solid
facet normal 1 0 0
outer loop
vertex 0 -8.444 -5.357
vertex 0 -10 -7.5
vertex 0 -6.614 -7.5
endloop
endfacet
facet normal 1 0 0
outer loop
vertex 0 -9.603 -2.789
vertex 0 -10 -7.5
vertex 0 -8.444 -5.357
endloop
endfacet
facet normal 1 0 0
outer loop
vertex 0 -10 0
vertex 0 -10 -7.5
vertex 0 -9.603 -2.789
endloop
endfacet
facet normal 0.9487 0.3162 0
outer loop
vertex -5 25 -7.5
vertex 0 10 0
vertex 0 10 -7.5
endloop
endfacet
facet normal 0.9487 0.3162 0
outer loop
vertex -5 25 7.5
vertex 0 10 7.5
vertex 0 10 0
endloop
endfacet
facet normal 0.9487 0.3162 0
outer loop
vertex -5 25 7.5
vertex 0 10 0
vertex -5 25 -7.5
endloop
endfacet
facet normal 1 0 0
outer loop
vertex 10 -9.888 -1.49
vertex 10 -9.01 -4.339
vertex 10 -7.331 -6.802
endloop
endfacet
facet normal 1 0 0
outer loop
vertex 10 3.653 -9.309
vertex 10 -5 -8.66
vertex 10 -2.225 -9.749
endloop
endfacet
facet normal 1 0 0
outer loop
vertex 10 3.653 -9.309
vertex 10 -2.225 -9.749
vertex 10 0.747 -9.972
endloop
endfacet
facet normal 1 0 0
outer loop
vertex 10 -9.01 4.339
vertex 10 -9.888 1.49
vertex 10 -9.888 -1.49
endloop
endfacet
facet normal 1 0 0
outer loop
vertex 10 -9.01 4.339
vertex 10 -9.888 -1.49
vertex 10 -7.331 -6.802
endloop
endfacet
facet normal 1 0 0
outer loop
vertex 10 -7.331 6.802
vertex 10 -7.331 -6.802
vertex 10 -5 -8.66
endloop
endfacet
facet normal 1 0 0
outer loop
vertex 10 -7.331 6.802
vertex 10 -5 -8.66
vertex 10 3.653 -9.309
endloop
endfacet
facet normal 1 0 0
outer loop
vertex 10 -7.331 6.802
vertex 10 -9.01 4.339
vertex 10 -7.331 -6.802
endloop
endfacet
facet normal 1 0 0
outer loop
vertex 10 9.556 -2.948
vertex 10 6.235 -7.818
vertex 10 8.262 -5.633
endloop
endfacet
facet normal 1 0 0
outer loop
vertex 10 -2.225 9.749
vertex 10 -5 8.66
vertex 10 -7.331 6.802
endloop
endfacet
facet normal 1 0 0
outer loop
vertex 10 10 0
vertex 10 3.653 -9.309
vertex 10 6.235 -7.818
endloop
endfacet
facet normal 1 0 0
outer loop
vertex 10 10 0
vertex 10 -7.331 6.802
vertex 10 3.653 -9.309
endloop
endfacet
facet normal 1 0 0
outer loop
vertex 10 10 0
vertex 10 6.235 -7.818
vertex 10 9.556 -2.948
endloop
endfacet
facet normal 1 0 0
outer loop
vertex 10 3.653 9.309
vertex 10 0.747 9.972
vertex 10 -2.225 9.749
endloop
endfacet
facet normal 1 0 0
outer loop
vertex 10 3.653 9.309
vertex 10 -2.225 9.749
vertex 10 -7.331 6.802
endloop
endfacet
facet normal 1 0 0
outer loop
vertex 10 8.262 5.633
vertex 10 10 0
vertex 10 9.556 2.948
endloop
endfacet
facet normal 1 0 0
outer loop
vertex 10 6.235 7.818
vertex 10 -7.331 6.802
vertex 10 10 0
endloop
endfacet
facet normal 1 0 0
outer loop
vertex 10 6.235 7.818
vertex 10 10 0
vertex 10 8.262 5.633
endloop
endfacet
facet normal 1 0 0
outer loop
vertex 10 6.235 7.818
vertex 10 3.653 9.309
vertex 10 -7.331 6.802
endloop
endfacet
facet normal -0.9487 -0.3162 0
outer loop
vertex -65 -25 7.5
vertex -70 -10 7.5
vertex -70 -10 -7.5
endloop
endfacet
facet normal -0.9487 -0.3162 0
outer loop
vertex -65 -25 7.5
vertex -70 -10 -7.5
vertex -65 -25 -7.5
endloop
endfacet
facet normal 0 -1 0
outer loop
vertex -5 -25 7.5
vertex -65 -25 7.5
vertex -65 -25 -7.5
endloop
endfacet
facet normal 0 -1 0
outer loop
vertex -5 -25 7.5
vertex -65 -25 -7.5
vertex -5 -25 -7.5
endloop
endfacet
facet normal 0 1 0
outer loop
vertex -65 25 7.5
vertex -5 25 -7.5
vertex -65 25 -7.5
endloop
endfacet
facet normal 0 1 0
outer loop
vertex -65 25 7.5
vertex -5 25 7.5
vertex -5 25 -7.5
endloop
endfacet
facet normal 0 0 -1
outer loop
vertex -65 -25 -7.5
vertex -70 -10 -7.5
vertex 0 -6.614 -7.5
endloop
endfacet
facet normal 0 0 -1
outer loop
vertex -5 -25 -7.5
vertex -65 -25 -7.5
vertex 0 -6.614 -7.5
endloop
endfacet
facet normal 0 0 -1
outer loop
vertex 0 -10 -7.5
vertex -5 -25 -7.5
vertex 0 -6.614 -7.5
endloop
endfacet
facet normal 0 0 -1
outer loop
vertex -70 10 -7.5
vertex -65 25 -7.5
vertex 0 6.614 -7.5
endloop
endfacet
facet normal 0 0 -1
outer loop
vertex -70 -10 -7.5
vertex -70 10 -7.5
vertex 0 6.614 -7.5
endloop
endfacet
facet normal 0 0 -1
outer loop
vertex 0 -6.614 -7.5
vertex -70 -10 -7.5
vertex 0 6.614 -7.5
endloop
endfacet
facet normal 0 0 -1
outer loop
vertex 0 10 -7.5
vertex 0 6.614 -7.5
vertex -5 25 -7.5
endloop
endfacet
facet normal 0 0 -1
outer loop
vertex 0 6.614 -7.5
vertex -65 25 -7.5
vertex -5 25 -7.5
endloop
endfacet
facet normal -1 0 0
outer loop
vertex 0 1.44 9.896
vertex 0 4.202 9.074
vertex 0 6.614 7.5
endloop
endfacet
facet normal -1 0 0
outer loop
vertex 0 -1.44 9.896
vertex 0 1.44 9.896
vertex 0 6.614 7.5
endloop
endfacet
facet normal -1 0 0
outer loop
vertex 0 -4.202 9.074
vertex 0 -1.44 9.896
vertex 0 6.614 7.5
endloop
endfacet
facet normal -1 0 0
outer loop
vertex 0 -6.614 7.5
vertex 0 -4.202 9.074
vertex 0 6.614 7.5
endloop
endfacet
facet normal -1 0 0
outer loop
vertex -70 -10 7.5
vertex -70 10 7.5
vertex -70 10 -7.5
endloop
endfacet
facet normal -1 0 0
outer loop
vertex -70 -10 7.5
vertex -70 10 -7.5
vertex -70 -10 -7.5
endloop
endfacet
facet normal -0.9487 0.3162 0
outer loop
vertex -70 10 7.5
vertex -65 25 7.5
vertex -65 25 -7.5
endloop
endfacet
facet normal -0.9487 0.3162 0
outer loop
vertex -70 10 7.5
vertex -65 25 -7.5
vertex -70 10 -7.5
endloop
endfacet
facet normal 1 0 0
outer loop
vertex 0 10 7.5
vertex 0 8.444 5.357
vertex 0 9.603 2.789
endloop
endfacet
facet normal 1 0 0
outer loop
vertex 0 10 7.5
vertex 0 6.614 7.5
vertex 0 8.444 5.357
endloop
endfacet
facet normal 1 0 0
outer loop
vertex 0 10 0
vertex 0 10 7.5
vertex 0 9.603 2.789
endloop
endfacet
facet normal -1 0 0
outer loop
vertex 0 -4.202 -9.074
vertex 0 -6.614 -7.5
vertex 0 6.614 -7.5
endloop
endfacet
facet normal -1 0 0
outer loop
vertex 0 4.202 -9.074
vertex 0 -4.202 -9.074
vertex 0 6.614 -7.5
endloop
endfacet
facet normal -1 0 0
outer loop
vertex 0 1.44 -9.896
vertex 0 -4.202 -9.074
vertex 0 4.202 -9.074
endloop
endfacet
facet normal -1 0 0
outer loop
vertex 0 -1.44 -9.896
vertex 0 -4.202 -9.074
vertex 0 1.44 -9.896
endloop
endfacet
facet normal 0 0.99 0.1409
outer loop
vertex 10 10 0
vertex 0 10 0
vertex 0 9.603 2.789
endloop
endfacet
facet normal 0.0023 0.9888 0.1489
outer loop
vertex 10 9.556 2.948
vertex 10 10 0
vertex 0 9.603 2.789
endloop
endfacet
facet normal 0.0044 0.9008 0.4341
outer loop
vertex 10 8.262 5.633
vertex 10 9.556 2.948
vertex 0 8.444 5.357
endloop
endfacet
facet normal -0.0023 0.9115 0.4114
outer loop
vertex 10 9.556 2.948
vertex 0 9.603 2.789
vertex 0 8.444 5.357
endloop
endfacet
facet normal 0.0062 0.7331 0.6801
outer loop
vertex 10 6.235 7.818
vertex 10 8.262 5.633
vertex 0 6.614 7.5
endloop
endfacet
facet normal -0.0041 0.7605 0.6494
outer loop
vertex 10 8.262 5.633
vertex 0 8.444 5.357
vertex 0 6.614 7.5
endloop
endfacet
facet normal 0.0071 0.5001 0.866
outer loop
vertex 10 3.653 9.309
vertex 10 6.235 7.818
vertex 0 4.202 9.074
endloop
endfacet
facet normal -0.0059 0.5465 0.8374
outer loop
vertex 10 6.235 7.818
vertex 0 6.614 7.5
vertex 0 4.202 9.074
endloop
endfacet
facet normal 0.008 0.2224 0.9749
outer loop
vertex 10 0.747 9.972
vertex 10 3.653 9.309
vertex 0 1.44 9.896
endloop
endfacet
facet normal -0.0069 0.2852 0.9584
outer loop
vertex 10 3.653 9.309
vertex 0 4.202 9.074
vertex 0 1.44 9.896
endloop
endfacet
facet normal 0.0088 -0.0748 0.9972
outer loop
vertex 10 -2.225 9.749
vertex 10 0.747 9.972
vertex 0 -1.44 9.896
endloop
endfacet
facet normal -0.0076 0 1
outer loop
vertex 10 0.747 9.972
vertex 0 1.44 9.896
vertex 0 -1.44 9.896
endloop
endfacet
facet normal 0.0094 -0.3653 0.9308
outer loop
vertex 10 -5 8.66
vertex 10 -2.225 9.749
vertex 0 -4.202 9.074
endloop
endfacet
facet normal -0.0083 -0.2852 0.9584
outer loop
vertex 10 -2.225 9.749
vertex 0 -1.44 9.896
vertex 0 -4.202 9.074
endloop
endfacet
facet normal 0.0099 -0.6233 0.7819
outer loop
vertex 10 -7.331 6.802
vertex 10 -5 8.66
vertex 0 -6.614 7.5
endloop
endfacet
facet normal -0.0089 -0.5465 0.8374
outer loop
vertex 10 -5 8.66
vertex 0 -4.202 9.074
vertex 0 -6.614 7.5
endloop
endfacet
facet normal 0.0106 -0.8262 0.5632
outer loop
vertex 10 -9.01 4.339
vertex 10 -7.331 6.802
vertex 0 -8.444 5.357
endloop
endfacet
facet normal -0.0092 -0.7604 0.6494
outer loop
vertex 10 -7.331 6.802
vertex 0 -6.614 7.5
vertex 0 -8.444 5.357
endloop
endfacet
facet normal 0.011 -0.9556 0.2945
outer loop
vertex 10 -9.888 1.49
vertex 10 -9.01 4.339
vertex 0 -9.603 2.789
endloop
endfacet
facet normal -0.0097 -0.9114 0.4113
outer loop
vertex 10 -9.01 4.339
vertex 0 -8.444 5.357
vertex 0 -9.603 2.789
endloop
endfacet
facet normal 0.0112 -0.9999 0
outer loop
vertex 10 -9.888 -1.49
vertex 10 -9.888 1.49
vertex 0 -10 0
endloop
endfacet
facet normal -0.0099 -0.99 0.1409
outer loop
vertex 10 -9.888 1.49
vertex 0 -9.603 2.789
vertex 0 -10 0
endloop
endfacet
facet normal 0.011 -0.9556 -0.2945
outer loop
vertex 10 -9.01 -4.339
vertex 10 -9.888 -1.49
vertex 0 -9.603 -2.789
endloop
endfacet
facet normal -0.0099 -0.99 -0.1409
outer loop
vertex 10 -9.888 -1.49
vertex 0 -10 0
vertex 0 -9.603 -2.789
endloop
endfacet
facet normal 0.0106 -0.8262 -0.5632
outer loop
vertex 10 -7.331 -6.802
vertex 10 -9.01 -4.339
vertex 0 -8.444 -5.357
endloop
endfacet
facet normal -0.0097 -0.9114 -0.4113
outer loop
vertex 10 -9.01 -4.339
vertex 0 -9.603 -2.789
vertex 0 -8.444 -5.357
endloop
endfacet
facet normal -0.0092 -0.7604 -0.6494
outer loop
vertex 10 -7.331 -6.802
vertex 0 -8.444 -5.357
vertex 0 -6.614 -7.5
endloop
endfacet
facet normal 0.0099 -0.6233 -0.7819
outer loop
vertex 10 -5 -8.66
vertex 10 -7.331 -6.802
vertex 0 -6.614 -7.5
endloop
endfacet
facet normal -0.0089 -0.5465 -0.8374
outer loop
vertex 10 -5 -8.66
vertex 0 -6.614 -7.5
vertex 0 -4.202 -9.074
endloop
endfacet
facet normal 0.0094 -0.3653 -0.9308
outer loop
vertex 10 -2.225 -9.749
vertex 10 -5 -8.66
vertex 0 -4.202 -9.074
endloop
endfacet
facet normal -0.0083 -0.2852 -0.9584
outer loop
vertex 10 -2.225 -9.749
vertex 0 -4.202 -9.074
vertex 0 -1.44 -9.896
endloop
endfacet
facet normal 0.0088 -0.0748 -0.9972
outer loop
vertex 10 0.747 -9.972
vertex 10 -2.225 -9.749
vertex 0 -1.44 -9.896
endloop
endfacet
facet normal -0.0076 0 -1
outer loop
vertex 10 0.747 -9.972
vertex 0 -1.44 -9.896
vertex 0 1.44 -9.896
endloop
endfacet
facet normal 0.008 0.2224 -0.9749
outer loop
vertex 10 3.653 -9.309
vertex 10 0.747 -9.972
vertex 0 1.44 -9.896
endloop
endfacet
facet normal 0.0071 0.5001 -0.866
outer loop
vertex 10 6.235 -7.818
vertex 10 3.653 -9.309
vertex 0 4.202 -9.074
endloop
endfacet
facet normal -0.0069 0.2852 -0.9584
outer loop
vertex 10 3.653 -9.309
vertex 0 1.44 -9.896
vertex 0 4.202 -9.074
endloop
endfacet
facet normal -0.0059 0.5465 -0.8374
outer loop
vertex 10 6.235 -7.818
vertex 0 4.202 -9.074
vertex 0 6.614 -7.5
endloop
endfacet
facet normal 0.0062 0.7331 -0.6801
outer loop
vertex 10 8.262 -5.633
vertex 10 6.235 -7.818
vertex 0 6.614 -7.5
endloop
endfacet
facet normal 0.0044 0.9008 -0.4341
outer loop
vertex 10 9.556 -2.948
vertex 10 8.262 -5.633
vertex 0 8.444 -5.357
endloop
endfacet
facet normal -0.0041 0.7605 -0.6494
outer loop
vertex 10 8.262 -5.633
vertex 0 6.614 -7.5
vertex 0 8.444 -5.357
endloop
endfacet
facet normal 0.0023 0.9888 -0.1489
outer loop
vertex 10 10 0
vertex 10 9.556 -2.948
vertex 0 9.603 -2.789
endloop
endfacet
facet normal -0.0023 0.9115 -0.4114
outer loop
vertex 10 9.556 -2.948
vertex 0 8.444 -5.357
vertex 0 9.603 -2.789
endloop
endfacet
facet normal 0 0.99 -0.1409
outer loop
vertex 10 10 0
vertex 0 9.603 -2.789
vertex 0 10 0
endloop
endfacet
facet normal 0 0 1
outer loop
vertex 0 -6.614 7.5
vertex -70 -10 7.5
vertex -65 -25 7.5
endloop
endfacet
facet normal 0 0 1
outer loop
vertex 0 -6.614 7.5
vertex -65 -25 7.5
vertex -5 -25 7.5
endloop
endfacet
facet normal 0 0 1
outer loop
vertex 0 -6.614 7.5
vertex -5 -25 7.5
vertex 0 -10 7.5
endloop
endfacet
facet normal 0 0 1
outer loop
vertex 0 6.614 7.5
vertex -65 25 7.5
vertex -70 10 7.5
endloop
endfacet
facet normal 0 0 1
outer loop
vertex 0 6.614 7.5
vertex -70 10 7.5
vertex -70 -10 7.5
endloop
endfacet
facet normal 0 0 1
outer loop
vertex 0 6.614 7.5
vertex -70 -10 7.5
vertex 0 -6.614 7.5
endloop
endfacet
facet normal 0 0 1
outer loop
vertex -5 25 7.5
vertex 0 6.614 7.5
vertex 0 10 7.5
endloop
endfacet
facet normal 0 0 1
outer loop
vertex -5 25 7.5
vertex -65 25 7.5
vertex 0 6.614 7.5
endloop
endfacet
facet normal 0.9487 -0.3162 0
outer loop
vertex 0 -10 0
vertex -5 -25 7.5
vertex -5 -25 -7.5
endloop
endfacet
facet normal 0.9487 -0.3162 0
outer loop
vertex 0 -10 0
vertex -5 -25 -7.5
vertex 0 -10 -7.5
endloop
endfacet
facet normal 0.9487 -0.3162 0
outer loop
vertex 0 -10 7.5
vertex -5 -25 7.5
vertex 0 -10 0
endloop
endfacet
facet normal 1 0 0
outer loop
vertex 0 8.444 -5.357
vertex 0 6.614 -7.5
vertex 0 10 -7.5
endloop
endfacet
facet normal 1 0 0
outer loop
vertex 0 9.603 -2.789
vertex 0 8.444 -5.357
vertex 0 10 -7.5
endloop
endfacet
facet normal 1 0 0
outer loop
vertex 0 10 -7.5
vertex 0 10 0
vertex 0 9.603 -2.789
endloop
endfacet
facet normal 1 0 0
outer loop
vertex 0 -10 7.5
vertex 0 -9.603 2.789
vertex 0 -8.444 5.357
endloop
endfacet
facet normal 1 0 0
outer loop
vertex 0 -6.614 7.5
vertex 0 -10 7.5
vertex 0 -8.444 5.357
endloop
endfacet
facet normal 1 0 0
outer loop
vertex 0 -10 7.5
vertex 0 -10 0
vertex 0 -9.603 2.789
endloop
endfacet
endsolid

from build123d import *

# Parameters (mm, degrees)
F0_R     = 10
F1_DEPTH = 10
F3_DEPTH = 7.5


with BuildPart() as f1:
    # F0 (on Right) → F1 (new body)
    with BuildSketch(Plane.YZ):
        Circle(F0_R)
    extrude(amount=F1_DEPTH)

    # F2 (on Top) → F3 (join, symmetric)
    with BuildSketch(Plane.XY):
        Polygon((-5, 25), (-65, 25), (-70, 10), (-70, -10), (-65, -25), (-5, -25), (0, -10), (0, 10), align=None)
    extrude(amount=F3_DEPTH, both=True)


solid = f1.part
